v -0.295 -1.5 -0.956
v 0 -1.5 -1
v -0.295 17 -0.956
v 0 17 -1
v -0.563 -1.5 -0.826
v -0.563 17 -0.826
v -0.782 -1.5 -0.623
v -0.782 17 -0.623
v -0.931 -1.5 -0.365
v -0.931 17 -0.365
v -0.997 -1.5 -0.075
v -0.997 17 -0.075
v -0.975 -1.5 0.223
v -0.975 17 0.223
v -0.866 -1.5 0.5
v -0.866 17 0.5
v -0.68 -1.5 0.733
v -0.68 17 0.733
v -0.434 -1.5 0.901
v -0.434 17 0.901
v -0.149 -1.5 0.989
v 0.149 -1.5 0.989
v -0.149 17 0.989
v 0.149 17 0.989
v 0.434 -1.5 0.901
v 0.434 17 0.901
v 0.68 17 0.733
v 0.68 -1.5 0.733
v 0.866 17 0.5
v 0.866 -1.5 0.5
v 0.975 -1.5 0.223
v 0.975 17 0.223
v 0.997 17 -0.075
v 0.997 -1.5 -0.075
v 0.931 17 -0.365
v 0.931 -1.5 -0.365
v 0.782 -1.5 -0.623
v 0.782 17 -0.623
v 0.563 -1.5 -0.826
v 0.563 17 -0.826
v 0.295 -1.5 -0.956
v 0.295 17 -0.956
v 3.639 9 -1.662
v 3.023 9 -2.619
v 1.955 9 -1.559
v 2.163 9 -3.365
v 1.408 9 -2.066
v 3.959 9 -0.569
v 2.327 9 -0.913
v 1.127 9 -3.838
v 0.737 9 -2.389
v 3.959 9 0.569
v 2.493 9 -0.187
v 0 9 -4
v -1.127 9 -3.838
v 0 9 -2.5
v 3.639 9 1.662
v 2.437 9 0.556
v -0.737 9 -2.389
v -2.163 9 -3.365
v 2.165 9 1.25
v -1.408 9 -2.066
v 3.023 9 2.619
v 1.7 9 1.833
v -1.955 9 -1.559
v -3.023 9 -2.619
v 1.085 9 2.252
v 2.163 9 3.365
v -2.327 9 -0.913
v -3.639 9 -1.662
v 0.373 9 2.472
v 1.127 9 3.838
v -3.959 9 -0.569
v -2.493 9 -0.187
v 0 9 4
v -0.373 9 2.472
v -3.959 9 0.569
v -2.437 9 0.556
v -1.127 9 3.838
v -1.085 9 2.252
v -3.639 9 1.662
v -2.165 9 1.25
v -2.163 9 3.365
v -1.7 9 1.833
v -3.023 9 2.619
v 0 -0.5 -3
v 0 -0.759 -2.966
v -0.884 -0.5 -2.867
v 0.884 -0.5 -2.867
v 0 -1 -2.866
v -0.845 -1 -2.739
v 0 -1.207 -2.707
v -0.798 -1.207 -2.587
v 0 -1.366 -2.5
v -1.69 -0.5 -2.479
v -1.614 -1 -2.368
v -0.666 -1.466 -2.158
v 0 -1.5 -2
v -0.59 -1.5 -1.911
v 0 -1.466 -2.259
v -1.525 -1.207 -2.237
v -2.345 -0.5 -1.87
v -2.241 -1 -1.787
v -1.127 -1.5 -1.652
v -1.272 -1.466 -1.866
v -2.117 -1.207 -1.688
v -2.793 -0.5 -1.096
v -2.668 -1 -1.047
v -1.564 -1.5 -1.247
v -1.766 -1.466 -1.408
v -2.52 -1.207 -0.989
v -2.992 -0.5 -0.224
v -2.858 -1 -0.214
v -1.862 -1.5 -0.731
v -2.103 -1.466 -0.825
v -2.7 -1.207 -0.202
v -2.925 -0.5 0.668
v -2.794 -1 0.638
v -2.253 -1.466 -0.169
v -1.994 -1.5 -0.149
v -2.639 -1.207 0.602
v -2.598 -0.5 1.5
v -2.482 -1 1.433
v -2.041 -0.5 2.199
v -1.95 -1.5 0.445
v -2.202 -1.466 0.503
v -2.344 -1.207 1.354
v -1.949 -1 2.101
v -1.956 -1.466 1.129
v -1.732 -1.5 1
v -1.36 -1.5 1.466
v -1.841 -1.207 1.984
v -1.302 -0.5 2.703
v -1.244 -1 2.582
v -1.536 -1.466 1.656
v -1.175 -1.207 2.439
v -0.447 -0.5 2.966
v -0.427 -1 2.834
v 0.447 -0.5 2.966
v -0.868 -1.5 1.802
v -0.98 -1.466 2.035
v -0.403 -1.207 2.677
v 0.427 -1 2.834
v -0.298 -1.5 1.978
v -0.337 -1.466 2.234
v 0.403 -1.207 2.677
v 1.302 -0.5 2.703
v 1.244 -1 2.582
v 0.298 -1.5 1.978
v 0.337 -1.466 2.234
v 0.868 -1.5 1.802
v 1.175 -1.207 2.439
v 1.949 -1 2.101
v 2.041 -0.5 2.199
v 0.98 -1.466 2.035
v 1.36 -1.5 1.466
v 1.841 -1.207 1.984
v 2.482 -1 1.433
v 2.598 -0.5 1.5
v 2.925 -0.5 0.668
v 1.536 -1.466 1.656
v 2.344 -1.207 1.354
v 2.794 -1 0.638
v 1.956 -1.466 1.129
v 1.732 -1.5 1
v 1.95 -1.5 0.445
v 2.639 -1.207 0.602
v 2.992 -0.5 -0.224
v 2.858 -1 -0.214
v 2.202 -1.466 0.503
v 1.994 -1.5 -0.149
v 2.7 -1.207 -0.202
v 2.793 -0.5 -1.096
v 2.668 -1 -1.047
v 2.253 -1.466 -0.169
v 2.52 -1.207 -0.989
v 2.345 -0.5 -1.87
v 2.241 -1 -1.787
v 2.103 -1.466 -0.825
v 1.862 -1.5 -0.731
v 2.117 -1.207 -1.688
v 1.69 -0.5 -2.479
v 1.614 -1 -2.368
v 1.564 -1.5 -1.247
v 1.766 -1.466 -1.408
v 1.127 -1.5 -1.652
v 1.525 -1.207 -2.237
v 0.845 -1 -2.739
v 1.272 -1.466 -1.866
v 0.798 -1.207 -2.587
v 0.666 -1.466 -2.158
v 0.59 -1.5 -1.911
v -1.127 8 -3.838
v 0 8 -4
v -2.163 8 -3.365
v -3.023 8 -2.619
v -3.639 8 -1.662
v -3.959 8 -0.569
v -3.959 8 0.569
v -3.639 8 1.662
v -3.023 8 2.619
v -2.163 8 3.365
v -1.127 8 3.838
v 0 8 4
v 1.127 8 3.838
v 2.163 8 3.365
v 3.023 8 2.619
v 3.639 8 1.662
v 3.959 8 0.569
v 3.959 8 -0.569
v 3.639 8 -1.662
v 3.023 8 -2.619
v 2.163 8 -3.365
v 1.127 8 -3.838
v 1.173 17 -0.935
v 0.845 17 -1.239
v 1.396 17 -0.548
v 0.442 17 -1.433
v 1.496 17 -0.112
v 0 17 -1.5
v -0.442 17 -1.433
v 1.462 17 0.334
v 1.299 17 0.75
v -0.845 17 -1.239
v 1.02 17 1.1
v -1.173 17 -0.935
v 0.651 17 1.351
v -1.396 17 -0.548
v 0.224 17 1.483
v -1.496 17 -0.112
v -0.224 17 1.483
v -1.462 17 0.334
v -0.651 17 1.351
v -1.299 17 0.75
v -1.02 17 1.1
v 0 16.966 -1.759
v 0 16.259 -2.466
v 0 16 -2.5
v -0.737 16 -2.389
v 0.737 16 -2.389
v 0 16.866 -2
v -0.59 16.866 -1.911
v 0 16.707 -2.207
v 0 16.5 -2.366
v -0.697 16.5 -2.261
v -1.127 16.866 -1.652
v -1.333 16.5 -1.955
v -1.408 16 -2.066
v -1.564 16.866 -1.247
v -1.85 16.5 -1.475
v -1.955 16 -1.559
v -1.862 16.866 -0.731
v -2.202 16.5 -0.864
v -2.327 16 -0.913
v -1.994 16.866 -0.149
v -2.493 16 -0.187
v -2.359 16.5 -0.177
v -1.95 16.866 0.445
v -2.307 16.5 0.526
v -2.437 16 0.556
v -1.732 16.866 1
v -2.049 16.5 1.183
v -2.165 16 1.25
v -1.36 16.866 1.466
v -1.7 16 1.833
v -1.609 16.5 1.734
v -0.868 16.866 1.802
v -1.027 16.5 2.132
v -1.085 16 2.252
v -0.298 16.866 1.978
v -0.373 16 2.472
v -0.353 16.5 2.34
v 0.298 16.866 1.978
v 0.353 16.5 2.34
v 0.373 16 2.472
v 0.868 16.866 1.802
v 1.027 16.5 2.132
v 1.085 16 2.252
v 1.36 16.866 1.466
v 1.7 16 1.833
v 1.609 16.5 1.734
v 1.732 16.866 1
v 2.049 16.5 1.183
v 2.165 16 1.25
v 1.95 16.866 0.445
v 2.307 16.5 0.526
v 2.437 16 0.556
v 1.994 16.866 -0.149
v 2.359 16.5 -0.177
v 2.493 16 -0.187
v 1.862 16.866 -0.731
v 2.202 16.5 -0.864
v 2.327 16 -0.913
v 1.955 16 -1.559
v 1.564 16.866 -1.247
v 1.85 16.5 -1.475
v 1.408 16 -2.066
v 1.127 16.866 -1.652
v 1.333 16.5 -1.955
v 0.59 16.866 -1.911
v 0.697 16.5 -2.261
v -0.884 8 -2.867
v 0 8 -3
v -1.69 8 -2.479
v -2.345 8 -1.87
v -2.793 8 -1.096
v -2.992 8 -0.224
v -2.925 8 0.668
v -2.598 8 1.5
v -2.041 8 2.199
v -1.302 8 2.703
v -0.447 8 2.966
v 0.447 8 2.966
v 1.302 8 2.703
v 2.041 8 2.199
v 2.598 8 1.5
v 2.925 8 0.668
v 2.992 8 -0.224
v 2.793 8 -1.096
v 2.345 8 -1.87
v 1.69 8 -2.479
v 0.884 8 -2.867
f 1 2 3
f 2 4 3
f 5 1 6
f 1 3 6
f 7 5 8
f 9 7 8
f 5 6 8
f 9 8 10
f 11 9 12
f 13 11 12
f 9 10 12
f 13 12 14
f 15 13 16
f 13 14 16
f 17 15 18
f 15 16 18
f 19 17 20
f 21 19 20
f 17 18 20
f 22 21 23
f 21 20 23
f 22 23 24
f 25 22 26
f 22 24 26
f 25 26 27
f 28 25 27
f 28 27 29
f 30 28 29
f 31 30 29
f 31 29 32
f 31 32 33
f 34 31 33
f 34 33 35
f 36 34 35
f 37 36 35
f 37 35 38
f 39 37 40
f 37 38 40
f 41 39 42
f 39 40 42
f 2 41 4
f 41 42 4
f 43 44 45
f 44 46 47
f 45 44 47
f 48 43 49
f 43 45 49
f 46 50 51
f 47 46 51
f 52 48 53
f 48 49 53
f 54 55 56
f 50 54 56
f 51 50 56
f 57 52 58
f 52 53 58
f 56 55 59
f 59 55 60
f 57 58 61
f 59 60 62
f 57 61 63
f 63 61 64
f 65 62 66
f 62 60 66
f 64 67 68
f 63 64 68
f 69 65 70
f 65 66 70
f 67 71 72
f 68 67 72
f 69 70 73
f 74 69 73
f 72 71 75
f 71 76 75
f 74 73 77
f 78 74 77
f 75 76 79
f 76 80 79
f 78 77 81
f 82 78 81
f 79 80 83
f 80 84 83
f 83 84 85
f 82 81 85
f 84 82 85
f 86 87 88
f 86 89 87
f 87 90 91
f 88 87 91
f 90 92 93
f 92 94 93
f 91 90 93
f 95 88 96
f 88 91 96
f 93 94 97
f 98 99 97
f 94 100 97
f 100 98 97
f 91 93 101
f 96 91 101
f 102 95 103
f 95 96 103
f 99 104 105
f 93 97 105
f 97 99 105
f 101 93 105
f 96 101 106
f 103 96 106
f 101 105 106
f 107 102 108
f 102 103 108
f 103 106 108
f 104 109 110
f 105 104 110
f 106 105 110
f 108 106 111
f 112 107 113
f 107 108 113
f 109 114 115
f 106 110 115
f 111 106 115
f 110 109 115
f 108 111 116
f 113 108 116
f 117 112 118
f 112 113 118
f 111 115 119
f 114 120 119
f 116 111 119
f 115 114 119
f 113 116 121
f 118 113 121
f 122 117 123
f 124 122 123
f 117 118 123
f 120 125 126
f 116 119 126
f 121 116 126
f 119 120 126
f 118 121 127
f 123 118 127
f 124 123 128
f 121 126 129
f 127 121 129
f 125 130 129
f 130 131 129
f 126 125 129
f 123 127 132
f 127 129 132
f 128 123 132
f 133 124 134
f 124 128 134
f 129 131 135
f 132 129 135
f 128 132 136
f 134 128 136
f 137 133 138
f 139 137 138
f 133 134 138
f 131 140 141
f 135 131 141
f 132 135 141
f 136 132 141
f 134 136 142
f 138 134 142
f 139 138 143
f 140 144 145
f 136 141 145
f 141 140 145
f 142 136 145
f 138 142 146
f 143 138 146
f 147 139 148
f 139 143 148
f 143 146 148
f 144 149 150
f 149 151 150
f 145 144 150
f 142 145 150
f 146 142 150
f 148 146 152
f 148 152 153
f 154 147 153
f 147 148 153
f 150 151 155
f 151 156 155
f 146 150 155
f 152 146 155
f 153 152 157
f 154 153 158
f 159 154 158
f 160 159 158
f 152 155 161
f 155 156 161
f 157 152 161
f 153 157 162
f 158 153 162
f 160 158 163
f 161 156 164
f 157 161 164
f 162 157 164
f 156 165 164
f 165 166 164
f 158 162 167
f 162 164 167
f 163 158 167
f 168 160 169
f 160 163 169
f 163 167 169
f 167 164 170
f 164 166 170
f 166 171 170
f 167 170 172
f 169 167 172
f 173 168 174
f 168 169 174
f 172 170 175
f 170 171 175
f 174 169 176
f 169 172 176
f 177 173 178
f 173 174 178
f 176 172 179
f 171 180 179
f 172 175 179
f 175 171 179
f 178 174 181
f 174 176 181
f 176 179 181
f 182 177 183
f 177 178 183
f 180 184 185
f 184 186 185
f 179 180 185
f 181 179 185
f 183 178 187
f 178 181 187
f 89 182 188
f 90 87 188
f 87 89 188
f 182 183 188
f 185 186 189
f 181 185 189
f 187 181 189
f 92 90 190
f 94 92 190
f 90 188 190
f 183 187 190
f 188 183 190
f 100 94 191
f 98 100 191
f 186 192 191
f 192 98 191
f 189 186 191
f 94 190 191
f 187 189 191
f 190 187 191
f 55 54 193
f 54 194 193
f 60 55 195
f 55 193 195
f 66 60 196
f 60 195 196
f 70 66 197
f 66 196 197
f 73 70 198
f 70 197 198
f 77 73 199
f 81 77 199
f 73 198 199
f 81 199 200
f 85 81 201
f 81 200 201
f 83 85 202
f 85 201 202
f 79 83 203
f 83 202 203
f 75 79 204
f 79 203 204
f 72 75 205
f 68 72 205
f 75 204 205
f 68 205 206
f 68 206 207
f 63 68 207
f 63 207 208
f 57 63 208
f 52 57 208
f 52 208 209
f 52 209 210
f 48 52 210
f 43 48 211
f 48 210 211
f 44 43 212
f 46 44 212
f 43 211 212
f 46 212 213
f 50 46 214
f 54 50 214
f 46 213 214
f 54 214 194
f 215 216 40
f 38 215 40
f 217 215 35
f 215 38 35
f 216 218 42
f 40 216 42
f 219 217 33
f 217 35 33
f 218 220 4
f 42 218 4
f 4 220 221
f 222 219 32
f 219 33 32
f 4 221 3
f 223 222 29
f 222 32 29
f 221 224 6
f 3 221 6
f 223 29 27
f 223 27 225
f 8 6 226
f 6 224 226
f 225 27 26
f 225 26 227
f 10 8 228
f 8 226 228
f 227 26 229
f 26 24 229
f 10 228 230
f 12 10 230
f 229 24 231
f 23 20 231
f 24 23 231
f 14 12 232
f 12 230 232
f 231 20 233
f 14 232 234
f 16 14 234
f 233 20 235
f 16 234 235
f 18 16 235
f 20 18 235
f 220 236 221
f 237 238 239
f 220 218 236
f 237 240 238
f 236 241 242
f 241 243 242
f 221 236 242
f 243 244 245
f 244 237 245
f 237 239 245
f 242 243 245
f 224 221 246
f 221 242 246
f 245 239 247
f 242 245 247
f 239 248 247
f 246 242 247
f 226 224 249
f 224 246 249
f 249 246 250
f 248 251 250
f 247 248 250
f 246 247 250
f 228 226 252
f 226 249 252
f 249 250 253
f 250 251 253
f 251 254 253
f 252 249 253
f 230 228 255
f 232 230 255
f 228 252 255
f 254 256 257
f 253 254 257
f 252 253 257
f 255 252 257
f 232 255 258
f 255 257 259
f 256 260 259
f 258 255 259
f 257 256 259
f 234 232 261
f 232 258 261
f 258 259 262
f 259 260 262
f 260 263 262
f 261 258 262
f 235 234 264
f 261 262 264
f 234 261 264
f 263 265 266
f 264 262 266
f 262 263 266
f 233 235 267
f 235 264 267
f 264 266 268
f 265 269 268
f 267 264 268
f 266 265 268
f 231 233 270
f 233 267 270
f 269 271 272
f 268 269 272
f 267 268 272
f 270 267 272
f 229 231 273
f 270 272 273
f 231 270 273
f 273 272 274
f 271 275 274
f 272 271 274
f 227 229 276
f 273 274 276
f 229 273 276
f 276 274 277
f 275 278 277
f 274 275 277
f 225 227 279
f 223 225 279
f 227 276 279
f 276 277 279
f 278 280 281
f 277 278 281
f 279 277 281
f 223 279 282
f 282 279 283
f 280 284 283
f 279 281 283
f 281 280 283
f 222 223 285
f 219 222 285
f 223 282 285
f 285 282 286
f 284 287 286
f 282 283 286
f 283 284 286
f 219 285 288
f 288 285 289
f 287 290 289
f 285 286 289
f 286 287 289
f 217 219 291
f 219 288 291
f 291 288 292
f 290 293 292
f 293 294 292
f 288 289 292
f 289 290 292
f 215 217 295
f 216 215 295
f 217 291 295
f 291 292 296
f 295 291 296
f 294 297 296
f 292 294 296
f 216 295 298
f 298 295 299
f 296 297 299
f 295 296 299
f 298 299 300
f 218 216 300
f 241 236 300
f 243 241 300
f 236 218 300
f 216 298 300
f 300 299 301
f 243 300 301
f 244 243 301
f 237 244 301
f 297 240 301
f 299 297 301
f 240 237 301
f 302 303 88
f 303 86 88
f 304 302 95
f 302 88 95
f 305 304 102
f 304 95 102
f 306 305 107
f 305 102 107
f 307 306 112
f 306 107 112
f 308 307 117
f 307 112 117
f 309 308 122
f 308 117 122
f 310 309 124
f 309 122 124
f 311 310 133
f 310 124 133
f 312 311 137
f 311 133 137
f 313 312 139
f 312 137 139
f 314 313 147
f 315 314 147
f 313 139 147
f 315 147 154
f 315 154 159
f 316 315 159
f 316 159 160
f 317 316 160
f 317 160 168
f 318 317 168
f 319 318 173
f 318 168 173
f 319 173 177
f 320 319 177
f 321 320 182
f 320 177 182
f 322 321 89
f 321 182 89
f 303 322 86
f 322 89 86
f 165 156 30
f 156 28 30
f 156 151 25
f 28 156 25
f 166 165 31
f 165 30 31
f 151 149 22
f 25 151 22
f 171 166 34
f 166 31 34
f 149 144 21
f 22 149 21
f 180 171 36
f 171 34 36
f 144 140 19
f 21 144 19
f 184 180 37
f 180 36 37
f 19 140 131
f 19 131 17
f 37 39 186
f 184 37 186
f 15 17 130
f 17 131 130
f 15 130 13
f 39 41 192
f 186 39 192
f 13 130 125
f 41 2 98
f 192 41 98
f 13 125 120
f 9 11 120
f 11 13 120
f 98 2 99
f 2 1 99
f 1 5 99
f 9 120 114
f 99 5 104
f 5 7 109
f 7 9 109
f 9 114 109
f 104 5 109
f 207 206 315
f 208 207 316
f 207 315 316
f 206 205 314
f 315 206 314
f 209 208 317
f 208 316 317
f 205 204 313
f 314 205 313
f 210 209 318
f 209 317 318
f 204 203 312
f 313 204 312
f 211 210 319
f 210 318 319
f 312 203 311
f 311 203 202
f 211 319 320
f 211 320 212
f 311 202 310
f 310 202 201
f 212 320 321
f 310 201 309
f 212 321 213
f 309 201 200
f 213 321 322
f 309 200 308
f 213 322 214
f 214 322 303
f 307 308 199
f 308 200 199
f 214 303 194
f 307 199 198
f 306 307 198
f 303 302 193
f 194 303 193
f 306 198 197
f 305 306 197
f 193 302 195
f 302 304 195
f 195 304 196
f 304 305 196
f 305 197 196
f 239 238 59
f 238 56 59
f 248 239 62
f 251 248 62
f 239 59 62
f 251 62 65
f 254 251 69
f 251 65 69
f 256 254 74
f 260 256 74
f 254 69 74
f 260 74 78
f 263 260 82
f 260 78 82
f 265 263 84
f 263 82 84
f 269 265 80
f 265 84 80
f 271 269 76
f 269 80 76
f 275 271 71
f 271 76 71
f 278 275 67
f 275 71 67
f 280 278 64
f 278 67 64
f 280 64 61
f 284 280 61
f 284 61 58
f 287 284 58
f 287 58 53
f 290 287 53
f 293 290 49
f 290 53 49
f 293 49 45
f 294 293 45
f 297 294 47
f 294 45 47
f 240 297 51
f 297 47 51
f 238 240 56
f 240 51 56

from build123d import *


with BuildPart() as part:
    # Эскиз1 → Повернуть1 (revolve)
    with BuildSketch(Plane(origin=(0, 0, 0), x_dir=(0, 0, -1), z_dir=(1, 0, 0))):
        with BuildLine():
            Line((2.5, 16), (2.5, 9))
            Line((2.5, 9), (4, 9))
            Line((4, 9), (4, 8))
            Line((4, 8), (3, 8))
            Line((3, 8), (3, -0.5))
            ThreePointArc((3, -0.5), (2.707106781, -1.207106781), (2, -1.5))
            Line((2, -1.5), (1, -1.5))
            Line((1, -1.5), (1, 17))
            Line((1, 17), (1.5, 17))
            ThreePointArc((1.5, 17), (2.207106781, 16.707106781), (2.5, 16))
        make_face()
    revolve(axis=Axis((0, 0, 0), (0, 1, 0)))


solid = part.part
